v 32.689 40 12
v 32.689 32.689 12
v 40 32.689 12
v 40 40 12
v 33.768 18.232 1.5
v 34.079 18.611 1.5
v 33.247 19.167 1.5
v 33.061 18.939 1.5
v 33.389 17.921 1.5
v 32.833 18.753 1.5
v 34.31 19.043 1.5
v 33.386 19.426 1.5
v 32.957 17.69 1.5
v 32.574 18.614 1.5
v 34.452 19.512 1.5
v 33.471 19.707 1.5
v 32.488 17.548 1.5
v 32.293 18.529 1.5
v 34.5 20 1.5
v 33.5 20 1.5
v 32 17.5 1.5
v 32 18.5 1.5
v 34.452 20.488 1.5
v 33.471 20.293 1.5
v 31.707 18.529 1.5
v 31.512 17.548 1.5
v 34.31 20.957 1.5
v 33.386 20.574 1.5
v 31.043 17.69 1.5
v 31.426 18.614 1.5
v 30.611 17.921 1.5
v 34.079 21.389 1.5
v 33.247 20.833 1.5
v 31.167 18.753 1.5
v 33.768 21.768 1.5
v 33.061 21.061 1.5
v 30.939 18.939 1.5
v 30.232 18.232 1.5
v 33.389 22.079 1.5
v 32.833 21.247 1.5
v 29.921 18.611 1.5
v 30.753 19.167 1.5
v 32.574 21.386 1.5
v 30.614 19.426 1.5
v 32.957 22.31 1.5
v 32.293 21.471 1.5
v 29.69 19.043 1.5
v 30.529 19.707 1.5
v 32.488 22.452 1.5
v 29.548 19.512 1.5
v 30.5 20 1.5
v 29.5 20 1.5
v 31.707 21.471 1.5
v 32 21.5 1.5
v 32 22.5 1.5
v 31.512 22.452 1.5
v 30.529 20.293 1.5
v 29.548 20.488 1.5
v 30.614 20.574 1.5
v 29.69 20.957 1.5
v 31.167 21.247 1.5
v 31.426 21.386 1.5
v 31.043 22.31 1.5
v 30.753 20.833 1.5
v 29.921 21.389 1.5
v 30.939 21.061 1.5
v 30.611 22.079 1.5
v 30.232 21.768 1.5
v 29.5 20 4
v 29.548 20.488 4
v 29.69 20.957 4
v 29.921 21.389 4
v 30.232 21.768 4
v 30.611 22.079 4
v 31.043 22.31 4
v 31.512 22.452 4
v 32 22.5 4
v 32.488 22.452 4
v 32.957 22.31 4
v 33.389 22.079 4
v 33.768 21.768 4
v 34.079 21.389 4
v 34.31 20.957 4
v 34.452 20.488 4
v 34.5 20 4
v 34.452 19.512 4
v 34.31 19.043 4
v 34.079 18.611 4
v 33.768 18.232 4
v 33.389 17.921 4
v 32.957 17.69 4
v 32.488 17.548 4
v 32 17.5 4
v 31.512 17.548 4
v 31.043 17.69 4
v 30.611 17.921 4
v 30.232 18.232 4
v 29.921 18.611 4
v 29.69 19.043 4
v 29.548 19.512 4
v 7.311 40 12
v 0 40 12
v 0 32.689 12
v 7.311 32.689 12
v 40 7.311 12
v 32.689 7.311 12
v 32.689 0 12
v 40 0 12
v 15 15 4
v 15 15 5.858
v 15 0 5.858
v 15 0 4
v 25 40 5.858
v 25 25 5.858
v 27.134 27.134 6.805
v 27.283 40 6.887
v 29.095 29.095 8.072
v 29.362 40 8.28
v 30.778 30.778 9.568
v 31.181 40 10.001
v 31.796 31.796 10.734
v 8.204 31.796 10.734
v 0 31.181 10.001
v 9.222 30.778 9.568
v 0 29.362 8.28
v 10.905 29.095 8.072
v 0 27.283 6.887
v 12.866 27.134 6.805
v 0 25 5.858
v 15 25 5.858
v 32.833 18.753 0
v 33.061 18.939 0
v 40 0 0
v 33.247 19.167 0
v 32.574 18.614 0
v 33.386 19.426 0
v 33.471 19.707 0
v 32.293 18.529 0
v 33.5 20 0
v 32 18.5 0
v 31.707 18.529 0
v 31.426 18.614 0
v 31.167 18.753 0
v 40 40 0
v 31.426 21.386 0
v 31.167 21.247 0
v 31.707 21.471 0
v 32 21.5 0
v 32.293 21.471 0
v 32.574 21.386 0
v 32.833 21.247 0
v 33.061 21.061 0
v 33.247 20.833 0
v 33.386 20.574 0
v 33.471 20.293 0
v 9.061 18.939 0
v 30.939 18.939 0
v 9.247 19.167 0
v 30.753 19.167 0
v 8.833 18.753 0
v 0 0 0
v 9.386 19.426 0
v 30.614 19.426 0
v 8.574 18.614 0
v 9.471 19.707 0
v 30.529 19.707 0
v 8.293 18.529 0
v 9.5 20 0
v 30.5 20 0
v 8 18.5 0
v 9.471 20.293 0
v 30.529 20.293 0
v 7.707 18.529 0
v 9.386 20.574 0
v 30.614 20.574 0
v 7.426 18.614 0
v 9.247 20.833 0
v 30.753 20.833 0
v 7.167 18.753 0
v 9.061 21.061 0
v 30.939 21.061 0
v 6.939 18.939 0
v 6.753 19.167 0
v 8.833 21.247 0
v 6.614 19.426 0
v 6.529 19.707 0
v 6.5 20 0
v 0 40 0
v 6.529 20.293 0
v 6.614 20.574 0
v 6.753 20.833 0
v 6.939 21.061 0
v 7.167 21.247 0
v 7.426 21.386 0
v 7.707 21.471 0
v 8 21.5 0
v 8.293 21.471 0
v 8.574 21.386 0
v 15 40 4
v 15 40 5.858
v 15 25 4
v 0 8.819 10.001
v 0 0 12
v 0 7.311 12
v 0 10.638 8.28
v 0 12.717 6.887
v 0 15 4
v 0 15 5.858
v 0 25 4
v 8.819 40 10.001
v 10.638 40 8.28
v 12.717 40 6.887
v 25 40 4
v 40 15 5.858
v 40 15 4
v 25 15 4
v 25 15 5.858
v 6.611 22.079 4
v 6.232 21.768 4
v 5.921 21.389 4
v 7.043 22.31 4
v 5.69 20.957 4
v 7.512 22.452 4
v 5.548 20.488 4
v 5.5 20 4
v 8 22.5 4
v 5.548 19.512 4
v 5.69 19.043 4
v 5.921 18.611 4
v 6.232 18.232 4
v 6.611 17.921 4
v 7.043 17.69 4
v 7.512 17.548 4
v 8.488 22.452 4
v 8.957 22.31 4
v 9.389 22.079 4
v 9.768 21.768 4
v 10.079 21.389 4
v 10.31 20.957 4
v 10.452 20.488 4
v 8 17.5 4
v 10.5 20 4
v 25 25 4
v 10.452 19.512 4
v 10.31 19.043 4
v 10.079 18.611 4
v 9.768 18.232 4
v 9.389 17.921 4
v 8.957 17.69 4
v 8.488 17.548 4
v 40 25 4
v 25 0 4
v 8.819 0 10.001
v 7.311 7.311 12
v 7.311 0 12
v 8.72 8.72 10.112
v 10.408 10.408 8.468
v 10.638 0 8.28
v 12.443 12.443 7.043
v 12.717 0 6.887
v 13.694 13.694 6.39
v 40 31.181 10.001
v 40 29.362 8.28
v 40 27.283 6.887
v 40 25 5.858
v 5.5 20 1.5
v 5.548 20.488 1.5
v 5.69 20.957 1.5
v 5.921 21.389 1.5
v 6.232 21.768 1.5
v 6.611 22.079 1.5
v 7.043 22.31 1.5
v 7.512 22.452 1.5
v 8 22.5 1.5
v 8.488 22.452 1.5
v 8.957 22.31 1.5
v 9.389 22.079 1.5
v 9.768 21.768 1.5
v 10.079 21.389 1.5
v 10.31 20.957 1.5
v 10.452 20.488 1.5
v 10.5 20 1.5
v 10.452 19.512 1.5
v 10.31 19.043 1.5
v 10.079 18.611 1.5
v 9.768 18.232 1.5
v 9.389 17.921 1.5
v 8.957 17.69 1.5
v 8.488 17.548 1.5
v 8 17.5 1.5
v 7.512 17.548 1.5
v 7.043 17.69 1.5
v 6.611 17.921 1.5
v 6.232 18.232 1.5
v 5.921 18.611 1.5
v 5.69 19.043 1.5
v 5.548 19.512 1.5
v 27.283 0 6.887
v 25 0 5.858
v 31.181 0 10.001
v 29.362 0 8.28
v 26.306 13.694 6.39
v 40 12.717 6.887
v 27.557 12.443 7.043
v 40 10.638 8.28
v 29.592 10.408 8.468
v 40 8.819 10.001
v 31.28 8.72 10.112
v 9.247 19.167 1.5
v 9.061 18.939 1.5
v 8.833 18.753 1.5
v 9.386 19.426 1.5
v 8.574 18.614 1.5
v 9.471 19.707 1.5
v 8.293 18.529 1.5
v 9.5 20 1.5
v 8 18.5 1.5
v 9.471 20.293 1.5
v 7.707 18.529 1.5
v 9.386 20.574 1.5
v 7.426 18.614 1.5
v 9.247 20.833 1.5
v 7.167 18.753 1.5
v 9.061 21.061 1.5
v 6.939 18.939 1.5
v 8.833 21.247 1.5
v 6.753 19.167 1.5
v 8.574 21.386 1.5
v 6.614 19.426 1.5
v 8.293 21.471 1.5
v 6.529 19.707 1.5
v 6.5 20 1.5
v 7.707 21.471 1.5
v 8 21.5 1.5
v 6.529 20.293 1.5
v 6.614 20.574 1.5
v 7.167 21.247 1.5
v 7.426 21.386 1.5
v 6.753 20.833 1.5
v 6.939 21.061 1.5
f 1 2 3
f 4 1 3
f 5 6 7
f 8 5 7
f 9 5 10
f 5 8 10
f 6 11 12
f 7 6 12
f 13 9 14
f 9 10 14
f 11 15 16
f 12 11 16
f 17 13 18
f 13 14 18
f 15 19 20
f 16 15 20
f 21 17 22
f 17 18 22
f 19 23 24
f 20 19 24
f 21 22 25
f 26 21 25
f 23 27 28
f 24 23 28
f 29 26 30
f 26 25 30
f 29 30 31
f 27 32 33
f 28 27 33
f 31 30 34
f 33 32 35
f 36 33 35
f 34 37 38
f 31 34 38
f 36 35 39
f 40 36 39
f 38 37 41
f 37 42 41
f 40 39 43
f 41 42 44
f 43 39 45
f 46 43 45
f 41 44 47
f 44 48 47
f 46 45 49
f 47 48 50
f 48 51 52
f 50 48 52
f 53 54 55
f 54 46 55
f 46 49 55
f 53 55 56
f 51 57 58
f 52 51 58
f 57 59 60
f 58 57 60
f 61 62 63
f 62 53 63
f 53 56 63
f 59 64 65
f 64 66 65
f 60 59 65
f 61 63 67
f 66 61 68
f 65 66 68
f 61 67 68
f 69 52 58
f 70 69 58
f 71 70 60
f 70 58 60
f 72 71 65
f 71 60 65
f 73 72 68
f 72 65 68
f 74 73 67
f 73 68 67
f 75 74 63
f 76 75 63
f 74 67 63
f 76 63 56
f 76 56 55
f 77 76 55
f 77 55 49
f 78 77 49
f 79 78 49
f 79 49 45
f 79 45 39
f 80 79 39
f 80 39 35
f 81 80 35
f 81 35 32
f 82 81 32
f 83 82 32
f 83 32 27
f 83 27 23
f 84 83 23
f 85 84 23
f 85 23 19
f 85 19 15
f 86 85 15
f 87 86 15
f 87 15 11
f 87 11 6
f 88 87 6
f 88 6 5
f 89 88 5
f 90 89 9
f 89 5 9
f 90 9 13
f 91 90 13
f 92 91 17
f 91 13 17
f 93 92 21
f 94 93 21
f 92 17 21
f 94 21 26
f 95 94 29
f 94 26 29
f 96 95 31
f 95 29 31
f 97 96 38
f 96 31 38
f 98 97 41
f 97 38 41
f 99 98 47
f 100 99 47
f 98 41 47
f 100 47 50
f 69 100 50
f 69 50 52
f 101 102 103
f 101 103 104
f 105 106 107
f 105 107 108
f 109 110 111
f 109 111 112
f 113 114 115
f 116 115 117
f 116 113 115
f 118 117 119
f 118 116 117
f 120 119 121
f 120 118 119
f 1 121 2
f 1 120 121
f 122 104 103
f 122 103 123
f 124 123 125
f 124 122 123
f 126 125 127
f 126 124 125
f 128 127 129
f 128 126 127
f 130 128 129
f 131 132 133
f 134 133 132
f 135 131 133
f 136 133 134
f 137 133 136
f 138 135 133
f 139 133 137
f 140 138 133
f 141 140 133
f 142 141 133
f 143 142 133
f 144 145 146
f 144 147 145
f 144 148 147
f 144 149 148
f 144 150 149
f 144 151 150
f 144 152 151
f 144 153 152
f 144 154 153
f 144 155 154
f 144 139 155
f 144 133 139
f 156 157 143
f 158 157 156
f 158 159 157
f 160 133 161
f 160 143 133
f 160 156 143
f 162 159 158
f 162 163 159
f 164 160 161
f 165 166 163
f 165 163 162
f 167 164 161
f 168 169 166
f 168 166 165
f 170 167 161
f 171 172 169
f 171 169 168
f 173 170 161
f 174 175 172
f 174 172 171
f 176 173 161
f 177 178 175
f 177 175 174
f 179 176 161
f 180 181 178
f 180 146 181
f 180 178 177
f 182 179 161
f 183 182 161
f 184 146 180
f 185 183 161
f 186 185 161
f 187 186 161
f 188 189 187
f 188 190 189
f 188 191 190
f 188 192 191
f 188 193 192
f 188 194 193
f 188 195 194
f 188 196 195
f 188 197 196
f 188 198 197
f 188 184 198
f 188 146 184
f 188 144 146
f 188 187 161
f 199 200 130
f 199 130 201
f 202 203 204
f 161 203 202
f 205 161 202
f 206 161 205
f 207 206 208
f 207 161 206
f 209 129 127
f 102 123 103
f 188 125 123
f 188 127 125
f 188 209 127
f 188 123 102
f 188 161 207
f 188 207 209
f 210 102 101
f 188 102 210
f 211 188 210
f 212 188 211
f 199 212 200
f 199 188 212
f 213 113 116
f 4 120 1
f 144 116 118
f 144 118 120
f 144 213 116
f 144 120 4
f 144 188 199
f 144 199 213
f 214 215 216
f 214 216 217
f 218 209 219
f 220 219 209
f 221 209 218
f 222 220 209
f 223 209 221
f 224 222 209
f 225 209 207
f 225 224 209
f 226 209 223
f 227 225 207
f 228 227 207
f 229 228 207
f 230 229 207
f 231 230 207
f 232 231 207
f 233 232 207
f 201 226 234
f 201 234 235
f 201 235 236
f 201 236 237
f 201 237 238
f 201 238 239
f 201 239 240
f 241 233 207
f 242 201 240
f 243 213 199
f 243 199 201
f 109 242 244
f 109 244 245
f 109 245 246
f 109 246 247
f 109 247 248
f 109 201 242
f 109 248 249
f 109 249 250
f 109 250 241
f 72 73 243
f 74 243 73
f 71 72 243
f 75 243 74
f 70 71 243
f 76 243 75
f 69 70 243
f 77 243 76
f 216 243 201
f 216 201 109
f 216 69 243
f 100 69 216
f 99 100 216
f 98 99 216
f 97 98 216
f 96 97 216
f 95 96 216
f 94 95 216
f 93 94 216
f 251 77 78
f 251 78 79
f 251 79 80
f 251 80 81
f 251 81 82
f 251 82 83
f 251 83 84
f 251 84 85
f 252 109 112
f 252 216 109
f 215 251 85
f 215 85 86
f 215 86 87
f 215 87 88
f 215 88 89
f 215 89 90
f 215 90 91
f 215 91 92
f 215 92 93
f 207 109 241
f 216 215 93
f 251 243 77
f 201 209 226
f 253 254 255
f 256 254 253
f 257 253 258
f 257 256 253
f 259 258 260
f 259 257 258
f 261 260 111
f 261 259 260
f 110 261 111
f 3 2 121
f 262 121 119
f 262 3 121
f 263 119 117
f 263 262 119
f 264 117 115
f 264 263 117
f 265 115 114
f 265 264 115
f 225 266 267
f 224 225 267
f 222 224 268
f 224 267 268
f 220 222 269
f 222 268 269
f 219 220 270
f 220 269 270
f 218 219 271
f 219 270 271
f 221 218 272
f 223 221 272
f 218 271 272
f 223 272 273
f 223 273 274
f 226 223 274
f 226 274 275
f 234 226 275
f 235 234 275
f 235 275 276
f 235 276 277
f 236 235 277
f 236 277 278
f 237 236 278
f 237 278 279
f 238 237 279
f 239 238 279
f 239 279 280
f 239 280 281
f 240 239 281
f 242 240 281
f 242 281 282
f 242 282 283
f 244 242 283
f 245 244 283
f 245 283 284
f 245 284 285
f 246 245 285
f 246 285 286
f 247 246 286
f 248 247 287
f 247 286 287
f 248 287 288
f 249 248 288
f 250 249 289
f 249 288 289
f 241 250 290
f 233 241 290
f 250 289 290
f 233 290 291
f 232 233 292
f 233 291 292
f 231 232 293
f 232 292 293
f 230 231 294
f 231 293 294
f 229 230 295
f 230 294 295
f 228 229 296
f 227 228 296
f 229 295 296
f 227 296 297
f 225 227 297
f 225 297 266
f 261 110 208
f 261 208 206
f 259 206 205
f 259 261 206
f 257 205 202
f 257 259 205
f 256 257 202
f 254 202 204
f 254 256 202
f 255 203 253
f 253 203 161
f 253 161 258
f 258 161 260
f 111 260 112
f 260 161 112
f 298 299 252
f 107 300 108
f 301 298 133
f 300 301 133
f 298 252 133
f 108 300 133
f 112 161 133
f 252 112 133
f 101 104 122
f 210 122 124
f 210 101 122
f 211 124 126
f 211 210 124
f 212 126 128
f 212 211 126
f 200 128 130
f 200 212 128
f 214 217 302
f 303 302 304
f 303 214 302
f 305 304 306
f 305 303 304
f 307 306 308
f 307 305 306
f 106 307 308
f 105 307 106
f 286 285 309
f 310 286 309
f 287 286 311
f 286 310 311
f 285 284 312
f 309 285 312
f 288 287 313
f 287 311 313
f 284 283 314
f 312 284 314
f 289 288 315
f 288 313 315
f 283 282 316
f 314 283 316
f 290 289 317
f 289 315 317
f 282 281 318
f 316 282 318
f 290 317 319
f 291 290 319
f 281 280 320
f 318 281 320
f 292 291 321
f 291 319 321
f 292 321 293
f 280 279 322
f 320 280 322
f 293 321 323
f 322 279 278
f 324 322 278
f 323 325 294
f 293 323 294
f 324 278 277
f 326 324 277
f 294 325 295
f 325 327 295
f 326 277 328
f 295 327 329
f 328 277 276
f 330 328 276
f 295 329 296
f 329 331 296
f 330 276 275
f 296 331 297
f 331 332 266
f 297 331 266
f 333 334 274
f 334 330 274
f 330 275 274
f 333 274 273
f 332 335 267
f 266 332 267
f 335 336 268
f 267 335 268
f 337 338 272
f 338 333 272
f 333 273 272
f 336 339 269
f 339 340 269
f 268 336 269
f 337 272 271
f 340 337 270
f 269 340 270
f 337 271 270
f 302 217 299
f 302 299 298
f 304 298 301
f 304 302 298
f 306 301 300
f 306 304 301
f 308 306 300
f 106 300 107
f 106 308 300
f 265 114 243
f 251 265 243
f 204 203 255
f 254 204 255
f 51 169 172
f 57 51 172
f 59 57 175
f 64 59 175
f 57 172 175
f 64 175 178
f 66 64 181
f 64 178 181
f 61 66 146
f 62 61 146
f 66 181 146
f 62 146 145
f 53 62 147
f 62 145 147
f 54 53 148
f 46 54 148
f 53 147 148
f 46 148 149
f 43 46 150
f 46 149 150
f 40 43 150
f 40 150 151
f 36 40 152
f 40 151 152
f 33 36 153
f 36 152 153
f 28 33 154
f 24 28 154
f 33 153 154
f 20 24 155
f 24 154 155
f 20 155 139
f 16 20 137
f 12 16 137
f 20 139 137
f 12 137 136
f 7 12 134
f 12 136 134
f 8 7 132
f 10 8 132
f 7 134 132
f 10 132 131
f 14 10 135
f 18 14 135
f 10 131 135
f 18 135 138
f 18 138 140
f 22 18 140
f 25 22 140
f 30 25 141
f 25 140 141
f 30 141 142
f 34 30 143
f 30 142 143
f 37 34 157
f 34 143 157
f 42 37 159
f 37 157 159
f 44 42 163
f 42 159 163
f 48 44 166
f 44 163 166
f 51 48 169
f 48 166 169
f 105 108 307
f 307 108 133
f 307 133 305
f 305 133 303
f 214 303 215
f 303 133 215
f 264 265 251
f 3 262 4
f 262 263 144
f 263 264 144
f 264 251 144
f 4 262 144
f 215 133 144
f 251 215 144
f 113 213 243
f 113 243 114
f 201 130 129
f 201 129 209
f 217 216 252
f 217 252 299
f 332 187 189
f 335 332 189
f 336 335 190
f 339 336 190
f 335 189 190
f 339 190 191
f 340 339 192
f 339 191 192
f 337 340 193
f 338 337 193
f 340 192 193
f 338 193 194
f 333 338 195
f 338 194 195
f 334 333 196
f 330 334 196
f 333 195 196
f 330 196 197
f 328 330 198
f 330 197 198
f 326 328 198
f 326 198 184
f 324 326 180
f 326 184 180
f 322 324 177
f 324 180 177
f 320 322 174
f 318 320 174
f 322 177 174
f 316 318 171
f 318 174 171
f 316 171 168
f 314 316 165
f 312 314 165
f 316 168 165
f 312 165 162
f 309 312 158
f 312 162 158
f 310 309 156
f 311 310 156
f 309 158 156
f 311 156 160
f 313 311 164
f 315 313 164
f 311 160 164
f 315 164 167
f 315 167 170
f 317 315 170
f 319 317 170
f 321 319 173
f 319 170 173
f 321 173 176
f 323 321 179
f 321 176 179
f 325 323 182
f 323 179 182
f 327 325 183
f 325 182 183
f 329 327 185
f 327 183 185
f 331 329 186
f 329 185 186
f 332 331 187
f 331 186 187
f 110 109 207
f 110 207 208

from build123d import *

# Parameters (mm, degrees)
SKETCH1_W           = 40
SKETCH1_H           = 40
BOSS_EXTRUDE1_DEPTH = 12
CUT_EXTRUDE1_DEPTH  = 40
SKETCH3_R           = 2.5
CUT_EXTRUDE3_DEPTH  = 40
SKETCH3_5_R         = 2.5
SKETCH3_5_R_2       = 1.5
BOSS_EXTRUDE3_DEPTH = 1.5
CIRPATTERN3_COUNT   = 2
CIRPATTERN3_ANGLE   = 90


with BuildPart() as part:
    # Sketch1 → Boss-Extrude1 (new body)
    with BuildSketch(Plane.XY):
        with Locations((20, 20)):
            Rectangle(SKETCH1_W, SKETCH1_H)
    extrude(amount=BOSS_EXTRUDE1_DEPTH)

    # Sketch2 → Cut-Extrude1 (cut)
    with BuildSketch(Plane(origin=(40, 0, 0), x_dir=(0, 0, -1), z_dir=(1, 0, 0))):
        with BuildLine():
            Line((-5, 25), (-4, 25))
            Line((-4, 25), (-4, 15))
            Line((-4, 15), (-5, 15))
            Line((-5, 15), (-5.857864376, 15))
            ThreePointArc((-5.857864376, 15), (-35, 20), (-5.857864376, 25))
            Line((-5.857864376, 25), (-5, 25))
        make_face()
    cut_extrude1 = extrude(amount=-CUT_EXTRUDE1_DEPTH, mode=Mode.SUBTRACT)

    # Sketch3 → Cut-Extrude3 (cut)
    with BuildSketch(Plane(origin=(0, 0, 0), x_dir=(-1, 0, 0), z_dir=(0, 0, -1))):
        with Locations((-32, 20)):
            Circle(SKETCH3_R)
        with Locations((-8, 20)):
            Circle(SKETCH3_R)
    extrude(amount=-CUT_EXTRUDE3_DEPTH, mode=Mode.SUBTRACT)

    # Sketch3<5> → Boss-Extrude3 (add)
    # profile 1 of 2: a face of its own
    with BuildSketch(Plane(origin=(0, 0, 0), x_dir=(-1, 0, 0), z_dir=(0, 0, -1))):
        with Locations((-32, 20)):
            Circle(SKETCH3_5_R)
        with Locations((-32, 20)):
            Circle(SKETCH3_5_R_2, mode=Mode.SUBTRACT)
    # profile 2 of 2: a face of its own
    with BuildSketch(Plane(origin=(0, 0, 0), x_dir=(-1, 0, 0), z_dir=(0, 0, -1))):
        with Locations((-8, 20)):
            Circle(SKETCH3_5_R)
        with Locations((-8, 20)):
            Circle(SKETCH3_5_R_2, mode=Mode.SUBTRACT)
    extrude(amount=-BOSS_EXTRUDE3_DEPTH)

    # CirPattern3: Cut-Extrude1 ×2 about axis
    cirpattern3_axis = Axis((20, 20, 4), (0, 0, 1))
    for i in range(1, CIRPATTERN3_COUNT):
        add(cut_extrude1.rotate(cirpattern3_axis, i * CIRPATTERN3_ANGLE / (CIRPATTERN3_COUNT - 1)), mode=Mode.SUBTRACT)


solid = part.part
